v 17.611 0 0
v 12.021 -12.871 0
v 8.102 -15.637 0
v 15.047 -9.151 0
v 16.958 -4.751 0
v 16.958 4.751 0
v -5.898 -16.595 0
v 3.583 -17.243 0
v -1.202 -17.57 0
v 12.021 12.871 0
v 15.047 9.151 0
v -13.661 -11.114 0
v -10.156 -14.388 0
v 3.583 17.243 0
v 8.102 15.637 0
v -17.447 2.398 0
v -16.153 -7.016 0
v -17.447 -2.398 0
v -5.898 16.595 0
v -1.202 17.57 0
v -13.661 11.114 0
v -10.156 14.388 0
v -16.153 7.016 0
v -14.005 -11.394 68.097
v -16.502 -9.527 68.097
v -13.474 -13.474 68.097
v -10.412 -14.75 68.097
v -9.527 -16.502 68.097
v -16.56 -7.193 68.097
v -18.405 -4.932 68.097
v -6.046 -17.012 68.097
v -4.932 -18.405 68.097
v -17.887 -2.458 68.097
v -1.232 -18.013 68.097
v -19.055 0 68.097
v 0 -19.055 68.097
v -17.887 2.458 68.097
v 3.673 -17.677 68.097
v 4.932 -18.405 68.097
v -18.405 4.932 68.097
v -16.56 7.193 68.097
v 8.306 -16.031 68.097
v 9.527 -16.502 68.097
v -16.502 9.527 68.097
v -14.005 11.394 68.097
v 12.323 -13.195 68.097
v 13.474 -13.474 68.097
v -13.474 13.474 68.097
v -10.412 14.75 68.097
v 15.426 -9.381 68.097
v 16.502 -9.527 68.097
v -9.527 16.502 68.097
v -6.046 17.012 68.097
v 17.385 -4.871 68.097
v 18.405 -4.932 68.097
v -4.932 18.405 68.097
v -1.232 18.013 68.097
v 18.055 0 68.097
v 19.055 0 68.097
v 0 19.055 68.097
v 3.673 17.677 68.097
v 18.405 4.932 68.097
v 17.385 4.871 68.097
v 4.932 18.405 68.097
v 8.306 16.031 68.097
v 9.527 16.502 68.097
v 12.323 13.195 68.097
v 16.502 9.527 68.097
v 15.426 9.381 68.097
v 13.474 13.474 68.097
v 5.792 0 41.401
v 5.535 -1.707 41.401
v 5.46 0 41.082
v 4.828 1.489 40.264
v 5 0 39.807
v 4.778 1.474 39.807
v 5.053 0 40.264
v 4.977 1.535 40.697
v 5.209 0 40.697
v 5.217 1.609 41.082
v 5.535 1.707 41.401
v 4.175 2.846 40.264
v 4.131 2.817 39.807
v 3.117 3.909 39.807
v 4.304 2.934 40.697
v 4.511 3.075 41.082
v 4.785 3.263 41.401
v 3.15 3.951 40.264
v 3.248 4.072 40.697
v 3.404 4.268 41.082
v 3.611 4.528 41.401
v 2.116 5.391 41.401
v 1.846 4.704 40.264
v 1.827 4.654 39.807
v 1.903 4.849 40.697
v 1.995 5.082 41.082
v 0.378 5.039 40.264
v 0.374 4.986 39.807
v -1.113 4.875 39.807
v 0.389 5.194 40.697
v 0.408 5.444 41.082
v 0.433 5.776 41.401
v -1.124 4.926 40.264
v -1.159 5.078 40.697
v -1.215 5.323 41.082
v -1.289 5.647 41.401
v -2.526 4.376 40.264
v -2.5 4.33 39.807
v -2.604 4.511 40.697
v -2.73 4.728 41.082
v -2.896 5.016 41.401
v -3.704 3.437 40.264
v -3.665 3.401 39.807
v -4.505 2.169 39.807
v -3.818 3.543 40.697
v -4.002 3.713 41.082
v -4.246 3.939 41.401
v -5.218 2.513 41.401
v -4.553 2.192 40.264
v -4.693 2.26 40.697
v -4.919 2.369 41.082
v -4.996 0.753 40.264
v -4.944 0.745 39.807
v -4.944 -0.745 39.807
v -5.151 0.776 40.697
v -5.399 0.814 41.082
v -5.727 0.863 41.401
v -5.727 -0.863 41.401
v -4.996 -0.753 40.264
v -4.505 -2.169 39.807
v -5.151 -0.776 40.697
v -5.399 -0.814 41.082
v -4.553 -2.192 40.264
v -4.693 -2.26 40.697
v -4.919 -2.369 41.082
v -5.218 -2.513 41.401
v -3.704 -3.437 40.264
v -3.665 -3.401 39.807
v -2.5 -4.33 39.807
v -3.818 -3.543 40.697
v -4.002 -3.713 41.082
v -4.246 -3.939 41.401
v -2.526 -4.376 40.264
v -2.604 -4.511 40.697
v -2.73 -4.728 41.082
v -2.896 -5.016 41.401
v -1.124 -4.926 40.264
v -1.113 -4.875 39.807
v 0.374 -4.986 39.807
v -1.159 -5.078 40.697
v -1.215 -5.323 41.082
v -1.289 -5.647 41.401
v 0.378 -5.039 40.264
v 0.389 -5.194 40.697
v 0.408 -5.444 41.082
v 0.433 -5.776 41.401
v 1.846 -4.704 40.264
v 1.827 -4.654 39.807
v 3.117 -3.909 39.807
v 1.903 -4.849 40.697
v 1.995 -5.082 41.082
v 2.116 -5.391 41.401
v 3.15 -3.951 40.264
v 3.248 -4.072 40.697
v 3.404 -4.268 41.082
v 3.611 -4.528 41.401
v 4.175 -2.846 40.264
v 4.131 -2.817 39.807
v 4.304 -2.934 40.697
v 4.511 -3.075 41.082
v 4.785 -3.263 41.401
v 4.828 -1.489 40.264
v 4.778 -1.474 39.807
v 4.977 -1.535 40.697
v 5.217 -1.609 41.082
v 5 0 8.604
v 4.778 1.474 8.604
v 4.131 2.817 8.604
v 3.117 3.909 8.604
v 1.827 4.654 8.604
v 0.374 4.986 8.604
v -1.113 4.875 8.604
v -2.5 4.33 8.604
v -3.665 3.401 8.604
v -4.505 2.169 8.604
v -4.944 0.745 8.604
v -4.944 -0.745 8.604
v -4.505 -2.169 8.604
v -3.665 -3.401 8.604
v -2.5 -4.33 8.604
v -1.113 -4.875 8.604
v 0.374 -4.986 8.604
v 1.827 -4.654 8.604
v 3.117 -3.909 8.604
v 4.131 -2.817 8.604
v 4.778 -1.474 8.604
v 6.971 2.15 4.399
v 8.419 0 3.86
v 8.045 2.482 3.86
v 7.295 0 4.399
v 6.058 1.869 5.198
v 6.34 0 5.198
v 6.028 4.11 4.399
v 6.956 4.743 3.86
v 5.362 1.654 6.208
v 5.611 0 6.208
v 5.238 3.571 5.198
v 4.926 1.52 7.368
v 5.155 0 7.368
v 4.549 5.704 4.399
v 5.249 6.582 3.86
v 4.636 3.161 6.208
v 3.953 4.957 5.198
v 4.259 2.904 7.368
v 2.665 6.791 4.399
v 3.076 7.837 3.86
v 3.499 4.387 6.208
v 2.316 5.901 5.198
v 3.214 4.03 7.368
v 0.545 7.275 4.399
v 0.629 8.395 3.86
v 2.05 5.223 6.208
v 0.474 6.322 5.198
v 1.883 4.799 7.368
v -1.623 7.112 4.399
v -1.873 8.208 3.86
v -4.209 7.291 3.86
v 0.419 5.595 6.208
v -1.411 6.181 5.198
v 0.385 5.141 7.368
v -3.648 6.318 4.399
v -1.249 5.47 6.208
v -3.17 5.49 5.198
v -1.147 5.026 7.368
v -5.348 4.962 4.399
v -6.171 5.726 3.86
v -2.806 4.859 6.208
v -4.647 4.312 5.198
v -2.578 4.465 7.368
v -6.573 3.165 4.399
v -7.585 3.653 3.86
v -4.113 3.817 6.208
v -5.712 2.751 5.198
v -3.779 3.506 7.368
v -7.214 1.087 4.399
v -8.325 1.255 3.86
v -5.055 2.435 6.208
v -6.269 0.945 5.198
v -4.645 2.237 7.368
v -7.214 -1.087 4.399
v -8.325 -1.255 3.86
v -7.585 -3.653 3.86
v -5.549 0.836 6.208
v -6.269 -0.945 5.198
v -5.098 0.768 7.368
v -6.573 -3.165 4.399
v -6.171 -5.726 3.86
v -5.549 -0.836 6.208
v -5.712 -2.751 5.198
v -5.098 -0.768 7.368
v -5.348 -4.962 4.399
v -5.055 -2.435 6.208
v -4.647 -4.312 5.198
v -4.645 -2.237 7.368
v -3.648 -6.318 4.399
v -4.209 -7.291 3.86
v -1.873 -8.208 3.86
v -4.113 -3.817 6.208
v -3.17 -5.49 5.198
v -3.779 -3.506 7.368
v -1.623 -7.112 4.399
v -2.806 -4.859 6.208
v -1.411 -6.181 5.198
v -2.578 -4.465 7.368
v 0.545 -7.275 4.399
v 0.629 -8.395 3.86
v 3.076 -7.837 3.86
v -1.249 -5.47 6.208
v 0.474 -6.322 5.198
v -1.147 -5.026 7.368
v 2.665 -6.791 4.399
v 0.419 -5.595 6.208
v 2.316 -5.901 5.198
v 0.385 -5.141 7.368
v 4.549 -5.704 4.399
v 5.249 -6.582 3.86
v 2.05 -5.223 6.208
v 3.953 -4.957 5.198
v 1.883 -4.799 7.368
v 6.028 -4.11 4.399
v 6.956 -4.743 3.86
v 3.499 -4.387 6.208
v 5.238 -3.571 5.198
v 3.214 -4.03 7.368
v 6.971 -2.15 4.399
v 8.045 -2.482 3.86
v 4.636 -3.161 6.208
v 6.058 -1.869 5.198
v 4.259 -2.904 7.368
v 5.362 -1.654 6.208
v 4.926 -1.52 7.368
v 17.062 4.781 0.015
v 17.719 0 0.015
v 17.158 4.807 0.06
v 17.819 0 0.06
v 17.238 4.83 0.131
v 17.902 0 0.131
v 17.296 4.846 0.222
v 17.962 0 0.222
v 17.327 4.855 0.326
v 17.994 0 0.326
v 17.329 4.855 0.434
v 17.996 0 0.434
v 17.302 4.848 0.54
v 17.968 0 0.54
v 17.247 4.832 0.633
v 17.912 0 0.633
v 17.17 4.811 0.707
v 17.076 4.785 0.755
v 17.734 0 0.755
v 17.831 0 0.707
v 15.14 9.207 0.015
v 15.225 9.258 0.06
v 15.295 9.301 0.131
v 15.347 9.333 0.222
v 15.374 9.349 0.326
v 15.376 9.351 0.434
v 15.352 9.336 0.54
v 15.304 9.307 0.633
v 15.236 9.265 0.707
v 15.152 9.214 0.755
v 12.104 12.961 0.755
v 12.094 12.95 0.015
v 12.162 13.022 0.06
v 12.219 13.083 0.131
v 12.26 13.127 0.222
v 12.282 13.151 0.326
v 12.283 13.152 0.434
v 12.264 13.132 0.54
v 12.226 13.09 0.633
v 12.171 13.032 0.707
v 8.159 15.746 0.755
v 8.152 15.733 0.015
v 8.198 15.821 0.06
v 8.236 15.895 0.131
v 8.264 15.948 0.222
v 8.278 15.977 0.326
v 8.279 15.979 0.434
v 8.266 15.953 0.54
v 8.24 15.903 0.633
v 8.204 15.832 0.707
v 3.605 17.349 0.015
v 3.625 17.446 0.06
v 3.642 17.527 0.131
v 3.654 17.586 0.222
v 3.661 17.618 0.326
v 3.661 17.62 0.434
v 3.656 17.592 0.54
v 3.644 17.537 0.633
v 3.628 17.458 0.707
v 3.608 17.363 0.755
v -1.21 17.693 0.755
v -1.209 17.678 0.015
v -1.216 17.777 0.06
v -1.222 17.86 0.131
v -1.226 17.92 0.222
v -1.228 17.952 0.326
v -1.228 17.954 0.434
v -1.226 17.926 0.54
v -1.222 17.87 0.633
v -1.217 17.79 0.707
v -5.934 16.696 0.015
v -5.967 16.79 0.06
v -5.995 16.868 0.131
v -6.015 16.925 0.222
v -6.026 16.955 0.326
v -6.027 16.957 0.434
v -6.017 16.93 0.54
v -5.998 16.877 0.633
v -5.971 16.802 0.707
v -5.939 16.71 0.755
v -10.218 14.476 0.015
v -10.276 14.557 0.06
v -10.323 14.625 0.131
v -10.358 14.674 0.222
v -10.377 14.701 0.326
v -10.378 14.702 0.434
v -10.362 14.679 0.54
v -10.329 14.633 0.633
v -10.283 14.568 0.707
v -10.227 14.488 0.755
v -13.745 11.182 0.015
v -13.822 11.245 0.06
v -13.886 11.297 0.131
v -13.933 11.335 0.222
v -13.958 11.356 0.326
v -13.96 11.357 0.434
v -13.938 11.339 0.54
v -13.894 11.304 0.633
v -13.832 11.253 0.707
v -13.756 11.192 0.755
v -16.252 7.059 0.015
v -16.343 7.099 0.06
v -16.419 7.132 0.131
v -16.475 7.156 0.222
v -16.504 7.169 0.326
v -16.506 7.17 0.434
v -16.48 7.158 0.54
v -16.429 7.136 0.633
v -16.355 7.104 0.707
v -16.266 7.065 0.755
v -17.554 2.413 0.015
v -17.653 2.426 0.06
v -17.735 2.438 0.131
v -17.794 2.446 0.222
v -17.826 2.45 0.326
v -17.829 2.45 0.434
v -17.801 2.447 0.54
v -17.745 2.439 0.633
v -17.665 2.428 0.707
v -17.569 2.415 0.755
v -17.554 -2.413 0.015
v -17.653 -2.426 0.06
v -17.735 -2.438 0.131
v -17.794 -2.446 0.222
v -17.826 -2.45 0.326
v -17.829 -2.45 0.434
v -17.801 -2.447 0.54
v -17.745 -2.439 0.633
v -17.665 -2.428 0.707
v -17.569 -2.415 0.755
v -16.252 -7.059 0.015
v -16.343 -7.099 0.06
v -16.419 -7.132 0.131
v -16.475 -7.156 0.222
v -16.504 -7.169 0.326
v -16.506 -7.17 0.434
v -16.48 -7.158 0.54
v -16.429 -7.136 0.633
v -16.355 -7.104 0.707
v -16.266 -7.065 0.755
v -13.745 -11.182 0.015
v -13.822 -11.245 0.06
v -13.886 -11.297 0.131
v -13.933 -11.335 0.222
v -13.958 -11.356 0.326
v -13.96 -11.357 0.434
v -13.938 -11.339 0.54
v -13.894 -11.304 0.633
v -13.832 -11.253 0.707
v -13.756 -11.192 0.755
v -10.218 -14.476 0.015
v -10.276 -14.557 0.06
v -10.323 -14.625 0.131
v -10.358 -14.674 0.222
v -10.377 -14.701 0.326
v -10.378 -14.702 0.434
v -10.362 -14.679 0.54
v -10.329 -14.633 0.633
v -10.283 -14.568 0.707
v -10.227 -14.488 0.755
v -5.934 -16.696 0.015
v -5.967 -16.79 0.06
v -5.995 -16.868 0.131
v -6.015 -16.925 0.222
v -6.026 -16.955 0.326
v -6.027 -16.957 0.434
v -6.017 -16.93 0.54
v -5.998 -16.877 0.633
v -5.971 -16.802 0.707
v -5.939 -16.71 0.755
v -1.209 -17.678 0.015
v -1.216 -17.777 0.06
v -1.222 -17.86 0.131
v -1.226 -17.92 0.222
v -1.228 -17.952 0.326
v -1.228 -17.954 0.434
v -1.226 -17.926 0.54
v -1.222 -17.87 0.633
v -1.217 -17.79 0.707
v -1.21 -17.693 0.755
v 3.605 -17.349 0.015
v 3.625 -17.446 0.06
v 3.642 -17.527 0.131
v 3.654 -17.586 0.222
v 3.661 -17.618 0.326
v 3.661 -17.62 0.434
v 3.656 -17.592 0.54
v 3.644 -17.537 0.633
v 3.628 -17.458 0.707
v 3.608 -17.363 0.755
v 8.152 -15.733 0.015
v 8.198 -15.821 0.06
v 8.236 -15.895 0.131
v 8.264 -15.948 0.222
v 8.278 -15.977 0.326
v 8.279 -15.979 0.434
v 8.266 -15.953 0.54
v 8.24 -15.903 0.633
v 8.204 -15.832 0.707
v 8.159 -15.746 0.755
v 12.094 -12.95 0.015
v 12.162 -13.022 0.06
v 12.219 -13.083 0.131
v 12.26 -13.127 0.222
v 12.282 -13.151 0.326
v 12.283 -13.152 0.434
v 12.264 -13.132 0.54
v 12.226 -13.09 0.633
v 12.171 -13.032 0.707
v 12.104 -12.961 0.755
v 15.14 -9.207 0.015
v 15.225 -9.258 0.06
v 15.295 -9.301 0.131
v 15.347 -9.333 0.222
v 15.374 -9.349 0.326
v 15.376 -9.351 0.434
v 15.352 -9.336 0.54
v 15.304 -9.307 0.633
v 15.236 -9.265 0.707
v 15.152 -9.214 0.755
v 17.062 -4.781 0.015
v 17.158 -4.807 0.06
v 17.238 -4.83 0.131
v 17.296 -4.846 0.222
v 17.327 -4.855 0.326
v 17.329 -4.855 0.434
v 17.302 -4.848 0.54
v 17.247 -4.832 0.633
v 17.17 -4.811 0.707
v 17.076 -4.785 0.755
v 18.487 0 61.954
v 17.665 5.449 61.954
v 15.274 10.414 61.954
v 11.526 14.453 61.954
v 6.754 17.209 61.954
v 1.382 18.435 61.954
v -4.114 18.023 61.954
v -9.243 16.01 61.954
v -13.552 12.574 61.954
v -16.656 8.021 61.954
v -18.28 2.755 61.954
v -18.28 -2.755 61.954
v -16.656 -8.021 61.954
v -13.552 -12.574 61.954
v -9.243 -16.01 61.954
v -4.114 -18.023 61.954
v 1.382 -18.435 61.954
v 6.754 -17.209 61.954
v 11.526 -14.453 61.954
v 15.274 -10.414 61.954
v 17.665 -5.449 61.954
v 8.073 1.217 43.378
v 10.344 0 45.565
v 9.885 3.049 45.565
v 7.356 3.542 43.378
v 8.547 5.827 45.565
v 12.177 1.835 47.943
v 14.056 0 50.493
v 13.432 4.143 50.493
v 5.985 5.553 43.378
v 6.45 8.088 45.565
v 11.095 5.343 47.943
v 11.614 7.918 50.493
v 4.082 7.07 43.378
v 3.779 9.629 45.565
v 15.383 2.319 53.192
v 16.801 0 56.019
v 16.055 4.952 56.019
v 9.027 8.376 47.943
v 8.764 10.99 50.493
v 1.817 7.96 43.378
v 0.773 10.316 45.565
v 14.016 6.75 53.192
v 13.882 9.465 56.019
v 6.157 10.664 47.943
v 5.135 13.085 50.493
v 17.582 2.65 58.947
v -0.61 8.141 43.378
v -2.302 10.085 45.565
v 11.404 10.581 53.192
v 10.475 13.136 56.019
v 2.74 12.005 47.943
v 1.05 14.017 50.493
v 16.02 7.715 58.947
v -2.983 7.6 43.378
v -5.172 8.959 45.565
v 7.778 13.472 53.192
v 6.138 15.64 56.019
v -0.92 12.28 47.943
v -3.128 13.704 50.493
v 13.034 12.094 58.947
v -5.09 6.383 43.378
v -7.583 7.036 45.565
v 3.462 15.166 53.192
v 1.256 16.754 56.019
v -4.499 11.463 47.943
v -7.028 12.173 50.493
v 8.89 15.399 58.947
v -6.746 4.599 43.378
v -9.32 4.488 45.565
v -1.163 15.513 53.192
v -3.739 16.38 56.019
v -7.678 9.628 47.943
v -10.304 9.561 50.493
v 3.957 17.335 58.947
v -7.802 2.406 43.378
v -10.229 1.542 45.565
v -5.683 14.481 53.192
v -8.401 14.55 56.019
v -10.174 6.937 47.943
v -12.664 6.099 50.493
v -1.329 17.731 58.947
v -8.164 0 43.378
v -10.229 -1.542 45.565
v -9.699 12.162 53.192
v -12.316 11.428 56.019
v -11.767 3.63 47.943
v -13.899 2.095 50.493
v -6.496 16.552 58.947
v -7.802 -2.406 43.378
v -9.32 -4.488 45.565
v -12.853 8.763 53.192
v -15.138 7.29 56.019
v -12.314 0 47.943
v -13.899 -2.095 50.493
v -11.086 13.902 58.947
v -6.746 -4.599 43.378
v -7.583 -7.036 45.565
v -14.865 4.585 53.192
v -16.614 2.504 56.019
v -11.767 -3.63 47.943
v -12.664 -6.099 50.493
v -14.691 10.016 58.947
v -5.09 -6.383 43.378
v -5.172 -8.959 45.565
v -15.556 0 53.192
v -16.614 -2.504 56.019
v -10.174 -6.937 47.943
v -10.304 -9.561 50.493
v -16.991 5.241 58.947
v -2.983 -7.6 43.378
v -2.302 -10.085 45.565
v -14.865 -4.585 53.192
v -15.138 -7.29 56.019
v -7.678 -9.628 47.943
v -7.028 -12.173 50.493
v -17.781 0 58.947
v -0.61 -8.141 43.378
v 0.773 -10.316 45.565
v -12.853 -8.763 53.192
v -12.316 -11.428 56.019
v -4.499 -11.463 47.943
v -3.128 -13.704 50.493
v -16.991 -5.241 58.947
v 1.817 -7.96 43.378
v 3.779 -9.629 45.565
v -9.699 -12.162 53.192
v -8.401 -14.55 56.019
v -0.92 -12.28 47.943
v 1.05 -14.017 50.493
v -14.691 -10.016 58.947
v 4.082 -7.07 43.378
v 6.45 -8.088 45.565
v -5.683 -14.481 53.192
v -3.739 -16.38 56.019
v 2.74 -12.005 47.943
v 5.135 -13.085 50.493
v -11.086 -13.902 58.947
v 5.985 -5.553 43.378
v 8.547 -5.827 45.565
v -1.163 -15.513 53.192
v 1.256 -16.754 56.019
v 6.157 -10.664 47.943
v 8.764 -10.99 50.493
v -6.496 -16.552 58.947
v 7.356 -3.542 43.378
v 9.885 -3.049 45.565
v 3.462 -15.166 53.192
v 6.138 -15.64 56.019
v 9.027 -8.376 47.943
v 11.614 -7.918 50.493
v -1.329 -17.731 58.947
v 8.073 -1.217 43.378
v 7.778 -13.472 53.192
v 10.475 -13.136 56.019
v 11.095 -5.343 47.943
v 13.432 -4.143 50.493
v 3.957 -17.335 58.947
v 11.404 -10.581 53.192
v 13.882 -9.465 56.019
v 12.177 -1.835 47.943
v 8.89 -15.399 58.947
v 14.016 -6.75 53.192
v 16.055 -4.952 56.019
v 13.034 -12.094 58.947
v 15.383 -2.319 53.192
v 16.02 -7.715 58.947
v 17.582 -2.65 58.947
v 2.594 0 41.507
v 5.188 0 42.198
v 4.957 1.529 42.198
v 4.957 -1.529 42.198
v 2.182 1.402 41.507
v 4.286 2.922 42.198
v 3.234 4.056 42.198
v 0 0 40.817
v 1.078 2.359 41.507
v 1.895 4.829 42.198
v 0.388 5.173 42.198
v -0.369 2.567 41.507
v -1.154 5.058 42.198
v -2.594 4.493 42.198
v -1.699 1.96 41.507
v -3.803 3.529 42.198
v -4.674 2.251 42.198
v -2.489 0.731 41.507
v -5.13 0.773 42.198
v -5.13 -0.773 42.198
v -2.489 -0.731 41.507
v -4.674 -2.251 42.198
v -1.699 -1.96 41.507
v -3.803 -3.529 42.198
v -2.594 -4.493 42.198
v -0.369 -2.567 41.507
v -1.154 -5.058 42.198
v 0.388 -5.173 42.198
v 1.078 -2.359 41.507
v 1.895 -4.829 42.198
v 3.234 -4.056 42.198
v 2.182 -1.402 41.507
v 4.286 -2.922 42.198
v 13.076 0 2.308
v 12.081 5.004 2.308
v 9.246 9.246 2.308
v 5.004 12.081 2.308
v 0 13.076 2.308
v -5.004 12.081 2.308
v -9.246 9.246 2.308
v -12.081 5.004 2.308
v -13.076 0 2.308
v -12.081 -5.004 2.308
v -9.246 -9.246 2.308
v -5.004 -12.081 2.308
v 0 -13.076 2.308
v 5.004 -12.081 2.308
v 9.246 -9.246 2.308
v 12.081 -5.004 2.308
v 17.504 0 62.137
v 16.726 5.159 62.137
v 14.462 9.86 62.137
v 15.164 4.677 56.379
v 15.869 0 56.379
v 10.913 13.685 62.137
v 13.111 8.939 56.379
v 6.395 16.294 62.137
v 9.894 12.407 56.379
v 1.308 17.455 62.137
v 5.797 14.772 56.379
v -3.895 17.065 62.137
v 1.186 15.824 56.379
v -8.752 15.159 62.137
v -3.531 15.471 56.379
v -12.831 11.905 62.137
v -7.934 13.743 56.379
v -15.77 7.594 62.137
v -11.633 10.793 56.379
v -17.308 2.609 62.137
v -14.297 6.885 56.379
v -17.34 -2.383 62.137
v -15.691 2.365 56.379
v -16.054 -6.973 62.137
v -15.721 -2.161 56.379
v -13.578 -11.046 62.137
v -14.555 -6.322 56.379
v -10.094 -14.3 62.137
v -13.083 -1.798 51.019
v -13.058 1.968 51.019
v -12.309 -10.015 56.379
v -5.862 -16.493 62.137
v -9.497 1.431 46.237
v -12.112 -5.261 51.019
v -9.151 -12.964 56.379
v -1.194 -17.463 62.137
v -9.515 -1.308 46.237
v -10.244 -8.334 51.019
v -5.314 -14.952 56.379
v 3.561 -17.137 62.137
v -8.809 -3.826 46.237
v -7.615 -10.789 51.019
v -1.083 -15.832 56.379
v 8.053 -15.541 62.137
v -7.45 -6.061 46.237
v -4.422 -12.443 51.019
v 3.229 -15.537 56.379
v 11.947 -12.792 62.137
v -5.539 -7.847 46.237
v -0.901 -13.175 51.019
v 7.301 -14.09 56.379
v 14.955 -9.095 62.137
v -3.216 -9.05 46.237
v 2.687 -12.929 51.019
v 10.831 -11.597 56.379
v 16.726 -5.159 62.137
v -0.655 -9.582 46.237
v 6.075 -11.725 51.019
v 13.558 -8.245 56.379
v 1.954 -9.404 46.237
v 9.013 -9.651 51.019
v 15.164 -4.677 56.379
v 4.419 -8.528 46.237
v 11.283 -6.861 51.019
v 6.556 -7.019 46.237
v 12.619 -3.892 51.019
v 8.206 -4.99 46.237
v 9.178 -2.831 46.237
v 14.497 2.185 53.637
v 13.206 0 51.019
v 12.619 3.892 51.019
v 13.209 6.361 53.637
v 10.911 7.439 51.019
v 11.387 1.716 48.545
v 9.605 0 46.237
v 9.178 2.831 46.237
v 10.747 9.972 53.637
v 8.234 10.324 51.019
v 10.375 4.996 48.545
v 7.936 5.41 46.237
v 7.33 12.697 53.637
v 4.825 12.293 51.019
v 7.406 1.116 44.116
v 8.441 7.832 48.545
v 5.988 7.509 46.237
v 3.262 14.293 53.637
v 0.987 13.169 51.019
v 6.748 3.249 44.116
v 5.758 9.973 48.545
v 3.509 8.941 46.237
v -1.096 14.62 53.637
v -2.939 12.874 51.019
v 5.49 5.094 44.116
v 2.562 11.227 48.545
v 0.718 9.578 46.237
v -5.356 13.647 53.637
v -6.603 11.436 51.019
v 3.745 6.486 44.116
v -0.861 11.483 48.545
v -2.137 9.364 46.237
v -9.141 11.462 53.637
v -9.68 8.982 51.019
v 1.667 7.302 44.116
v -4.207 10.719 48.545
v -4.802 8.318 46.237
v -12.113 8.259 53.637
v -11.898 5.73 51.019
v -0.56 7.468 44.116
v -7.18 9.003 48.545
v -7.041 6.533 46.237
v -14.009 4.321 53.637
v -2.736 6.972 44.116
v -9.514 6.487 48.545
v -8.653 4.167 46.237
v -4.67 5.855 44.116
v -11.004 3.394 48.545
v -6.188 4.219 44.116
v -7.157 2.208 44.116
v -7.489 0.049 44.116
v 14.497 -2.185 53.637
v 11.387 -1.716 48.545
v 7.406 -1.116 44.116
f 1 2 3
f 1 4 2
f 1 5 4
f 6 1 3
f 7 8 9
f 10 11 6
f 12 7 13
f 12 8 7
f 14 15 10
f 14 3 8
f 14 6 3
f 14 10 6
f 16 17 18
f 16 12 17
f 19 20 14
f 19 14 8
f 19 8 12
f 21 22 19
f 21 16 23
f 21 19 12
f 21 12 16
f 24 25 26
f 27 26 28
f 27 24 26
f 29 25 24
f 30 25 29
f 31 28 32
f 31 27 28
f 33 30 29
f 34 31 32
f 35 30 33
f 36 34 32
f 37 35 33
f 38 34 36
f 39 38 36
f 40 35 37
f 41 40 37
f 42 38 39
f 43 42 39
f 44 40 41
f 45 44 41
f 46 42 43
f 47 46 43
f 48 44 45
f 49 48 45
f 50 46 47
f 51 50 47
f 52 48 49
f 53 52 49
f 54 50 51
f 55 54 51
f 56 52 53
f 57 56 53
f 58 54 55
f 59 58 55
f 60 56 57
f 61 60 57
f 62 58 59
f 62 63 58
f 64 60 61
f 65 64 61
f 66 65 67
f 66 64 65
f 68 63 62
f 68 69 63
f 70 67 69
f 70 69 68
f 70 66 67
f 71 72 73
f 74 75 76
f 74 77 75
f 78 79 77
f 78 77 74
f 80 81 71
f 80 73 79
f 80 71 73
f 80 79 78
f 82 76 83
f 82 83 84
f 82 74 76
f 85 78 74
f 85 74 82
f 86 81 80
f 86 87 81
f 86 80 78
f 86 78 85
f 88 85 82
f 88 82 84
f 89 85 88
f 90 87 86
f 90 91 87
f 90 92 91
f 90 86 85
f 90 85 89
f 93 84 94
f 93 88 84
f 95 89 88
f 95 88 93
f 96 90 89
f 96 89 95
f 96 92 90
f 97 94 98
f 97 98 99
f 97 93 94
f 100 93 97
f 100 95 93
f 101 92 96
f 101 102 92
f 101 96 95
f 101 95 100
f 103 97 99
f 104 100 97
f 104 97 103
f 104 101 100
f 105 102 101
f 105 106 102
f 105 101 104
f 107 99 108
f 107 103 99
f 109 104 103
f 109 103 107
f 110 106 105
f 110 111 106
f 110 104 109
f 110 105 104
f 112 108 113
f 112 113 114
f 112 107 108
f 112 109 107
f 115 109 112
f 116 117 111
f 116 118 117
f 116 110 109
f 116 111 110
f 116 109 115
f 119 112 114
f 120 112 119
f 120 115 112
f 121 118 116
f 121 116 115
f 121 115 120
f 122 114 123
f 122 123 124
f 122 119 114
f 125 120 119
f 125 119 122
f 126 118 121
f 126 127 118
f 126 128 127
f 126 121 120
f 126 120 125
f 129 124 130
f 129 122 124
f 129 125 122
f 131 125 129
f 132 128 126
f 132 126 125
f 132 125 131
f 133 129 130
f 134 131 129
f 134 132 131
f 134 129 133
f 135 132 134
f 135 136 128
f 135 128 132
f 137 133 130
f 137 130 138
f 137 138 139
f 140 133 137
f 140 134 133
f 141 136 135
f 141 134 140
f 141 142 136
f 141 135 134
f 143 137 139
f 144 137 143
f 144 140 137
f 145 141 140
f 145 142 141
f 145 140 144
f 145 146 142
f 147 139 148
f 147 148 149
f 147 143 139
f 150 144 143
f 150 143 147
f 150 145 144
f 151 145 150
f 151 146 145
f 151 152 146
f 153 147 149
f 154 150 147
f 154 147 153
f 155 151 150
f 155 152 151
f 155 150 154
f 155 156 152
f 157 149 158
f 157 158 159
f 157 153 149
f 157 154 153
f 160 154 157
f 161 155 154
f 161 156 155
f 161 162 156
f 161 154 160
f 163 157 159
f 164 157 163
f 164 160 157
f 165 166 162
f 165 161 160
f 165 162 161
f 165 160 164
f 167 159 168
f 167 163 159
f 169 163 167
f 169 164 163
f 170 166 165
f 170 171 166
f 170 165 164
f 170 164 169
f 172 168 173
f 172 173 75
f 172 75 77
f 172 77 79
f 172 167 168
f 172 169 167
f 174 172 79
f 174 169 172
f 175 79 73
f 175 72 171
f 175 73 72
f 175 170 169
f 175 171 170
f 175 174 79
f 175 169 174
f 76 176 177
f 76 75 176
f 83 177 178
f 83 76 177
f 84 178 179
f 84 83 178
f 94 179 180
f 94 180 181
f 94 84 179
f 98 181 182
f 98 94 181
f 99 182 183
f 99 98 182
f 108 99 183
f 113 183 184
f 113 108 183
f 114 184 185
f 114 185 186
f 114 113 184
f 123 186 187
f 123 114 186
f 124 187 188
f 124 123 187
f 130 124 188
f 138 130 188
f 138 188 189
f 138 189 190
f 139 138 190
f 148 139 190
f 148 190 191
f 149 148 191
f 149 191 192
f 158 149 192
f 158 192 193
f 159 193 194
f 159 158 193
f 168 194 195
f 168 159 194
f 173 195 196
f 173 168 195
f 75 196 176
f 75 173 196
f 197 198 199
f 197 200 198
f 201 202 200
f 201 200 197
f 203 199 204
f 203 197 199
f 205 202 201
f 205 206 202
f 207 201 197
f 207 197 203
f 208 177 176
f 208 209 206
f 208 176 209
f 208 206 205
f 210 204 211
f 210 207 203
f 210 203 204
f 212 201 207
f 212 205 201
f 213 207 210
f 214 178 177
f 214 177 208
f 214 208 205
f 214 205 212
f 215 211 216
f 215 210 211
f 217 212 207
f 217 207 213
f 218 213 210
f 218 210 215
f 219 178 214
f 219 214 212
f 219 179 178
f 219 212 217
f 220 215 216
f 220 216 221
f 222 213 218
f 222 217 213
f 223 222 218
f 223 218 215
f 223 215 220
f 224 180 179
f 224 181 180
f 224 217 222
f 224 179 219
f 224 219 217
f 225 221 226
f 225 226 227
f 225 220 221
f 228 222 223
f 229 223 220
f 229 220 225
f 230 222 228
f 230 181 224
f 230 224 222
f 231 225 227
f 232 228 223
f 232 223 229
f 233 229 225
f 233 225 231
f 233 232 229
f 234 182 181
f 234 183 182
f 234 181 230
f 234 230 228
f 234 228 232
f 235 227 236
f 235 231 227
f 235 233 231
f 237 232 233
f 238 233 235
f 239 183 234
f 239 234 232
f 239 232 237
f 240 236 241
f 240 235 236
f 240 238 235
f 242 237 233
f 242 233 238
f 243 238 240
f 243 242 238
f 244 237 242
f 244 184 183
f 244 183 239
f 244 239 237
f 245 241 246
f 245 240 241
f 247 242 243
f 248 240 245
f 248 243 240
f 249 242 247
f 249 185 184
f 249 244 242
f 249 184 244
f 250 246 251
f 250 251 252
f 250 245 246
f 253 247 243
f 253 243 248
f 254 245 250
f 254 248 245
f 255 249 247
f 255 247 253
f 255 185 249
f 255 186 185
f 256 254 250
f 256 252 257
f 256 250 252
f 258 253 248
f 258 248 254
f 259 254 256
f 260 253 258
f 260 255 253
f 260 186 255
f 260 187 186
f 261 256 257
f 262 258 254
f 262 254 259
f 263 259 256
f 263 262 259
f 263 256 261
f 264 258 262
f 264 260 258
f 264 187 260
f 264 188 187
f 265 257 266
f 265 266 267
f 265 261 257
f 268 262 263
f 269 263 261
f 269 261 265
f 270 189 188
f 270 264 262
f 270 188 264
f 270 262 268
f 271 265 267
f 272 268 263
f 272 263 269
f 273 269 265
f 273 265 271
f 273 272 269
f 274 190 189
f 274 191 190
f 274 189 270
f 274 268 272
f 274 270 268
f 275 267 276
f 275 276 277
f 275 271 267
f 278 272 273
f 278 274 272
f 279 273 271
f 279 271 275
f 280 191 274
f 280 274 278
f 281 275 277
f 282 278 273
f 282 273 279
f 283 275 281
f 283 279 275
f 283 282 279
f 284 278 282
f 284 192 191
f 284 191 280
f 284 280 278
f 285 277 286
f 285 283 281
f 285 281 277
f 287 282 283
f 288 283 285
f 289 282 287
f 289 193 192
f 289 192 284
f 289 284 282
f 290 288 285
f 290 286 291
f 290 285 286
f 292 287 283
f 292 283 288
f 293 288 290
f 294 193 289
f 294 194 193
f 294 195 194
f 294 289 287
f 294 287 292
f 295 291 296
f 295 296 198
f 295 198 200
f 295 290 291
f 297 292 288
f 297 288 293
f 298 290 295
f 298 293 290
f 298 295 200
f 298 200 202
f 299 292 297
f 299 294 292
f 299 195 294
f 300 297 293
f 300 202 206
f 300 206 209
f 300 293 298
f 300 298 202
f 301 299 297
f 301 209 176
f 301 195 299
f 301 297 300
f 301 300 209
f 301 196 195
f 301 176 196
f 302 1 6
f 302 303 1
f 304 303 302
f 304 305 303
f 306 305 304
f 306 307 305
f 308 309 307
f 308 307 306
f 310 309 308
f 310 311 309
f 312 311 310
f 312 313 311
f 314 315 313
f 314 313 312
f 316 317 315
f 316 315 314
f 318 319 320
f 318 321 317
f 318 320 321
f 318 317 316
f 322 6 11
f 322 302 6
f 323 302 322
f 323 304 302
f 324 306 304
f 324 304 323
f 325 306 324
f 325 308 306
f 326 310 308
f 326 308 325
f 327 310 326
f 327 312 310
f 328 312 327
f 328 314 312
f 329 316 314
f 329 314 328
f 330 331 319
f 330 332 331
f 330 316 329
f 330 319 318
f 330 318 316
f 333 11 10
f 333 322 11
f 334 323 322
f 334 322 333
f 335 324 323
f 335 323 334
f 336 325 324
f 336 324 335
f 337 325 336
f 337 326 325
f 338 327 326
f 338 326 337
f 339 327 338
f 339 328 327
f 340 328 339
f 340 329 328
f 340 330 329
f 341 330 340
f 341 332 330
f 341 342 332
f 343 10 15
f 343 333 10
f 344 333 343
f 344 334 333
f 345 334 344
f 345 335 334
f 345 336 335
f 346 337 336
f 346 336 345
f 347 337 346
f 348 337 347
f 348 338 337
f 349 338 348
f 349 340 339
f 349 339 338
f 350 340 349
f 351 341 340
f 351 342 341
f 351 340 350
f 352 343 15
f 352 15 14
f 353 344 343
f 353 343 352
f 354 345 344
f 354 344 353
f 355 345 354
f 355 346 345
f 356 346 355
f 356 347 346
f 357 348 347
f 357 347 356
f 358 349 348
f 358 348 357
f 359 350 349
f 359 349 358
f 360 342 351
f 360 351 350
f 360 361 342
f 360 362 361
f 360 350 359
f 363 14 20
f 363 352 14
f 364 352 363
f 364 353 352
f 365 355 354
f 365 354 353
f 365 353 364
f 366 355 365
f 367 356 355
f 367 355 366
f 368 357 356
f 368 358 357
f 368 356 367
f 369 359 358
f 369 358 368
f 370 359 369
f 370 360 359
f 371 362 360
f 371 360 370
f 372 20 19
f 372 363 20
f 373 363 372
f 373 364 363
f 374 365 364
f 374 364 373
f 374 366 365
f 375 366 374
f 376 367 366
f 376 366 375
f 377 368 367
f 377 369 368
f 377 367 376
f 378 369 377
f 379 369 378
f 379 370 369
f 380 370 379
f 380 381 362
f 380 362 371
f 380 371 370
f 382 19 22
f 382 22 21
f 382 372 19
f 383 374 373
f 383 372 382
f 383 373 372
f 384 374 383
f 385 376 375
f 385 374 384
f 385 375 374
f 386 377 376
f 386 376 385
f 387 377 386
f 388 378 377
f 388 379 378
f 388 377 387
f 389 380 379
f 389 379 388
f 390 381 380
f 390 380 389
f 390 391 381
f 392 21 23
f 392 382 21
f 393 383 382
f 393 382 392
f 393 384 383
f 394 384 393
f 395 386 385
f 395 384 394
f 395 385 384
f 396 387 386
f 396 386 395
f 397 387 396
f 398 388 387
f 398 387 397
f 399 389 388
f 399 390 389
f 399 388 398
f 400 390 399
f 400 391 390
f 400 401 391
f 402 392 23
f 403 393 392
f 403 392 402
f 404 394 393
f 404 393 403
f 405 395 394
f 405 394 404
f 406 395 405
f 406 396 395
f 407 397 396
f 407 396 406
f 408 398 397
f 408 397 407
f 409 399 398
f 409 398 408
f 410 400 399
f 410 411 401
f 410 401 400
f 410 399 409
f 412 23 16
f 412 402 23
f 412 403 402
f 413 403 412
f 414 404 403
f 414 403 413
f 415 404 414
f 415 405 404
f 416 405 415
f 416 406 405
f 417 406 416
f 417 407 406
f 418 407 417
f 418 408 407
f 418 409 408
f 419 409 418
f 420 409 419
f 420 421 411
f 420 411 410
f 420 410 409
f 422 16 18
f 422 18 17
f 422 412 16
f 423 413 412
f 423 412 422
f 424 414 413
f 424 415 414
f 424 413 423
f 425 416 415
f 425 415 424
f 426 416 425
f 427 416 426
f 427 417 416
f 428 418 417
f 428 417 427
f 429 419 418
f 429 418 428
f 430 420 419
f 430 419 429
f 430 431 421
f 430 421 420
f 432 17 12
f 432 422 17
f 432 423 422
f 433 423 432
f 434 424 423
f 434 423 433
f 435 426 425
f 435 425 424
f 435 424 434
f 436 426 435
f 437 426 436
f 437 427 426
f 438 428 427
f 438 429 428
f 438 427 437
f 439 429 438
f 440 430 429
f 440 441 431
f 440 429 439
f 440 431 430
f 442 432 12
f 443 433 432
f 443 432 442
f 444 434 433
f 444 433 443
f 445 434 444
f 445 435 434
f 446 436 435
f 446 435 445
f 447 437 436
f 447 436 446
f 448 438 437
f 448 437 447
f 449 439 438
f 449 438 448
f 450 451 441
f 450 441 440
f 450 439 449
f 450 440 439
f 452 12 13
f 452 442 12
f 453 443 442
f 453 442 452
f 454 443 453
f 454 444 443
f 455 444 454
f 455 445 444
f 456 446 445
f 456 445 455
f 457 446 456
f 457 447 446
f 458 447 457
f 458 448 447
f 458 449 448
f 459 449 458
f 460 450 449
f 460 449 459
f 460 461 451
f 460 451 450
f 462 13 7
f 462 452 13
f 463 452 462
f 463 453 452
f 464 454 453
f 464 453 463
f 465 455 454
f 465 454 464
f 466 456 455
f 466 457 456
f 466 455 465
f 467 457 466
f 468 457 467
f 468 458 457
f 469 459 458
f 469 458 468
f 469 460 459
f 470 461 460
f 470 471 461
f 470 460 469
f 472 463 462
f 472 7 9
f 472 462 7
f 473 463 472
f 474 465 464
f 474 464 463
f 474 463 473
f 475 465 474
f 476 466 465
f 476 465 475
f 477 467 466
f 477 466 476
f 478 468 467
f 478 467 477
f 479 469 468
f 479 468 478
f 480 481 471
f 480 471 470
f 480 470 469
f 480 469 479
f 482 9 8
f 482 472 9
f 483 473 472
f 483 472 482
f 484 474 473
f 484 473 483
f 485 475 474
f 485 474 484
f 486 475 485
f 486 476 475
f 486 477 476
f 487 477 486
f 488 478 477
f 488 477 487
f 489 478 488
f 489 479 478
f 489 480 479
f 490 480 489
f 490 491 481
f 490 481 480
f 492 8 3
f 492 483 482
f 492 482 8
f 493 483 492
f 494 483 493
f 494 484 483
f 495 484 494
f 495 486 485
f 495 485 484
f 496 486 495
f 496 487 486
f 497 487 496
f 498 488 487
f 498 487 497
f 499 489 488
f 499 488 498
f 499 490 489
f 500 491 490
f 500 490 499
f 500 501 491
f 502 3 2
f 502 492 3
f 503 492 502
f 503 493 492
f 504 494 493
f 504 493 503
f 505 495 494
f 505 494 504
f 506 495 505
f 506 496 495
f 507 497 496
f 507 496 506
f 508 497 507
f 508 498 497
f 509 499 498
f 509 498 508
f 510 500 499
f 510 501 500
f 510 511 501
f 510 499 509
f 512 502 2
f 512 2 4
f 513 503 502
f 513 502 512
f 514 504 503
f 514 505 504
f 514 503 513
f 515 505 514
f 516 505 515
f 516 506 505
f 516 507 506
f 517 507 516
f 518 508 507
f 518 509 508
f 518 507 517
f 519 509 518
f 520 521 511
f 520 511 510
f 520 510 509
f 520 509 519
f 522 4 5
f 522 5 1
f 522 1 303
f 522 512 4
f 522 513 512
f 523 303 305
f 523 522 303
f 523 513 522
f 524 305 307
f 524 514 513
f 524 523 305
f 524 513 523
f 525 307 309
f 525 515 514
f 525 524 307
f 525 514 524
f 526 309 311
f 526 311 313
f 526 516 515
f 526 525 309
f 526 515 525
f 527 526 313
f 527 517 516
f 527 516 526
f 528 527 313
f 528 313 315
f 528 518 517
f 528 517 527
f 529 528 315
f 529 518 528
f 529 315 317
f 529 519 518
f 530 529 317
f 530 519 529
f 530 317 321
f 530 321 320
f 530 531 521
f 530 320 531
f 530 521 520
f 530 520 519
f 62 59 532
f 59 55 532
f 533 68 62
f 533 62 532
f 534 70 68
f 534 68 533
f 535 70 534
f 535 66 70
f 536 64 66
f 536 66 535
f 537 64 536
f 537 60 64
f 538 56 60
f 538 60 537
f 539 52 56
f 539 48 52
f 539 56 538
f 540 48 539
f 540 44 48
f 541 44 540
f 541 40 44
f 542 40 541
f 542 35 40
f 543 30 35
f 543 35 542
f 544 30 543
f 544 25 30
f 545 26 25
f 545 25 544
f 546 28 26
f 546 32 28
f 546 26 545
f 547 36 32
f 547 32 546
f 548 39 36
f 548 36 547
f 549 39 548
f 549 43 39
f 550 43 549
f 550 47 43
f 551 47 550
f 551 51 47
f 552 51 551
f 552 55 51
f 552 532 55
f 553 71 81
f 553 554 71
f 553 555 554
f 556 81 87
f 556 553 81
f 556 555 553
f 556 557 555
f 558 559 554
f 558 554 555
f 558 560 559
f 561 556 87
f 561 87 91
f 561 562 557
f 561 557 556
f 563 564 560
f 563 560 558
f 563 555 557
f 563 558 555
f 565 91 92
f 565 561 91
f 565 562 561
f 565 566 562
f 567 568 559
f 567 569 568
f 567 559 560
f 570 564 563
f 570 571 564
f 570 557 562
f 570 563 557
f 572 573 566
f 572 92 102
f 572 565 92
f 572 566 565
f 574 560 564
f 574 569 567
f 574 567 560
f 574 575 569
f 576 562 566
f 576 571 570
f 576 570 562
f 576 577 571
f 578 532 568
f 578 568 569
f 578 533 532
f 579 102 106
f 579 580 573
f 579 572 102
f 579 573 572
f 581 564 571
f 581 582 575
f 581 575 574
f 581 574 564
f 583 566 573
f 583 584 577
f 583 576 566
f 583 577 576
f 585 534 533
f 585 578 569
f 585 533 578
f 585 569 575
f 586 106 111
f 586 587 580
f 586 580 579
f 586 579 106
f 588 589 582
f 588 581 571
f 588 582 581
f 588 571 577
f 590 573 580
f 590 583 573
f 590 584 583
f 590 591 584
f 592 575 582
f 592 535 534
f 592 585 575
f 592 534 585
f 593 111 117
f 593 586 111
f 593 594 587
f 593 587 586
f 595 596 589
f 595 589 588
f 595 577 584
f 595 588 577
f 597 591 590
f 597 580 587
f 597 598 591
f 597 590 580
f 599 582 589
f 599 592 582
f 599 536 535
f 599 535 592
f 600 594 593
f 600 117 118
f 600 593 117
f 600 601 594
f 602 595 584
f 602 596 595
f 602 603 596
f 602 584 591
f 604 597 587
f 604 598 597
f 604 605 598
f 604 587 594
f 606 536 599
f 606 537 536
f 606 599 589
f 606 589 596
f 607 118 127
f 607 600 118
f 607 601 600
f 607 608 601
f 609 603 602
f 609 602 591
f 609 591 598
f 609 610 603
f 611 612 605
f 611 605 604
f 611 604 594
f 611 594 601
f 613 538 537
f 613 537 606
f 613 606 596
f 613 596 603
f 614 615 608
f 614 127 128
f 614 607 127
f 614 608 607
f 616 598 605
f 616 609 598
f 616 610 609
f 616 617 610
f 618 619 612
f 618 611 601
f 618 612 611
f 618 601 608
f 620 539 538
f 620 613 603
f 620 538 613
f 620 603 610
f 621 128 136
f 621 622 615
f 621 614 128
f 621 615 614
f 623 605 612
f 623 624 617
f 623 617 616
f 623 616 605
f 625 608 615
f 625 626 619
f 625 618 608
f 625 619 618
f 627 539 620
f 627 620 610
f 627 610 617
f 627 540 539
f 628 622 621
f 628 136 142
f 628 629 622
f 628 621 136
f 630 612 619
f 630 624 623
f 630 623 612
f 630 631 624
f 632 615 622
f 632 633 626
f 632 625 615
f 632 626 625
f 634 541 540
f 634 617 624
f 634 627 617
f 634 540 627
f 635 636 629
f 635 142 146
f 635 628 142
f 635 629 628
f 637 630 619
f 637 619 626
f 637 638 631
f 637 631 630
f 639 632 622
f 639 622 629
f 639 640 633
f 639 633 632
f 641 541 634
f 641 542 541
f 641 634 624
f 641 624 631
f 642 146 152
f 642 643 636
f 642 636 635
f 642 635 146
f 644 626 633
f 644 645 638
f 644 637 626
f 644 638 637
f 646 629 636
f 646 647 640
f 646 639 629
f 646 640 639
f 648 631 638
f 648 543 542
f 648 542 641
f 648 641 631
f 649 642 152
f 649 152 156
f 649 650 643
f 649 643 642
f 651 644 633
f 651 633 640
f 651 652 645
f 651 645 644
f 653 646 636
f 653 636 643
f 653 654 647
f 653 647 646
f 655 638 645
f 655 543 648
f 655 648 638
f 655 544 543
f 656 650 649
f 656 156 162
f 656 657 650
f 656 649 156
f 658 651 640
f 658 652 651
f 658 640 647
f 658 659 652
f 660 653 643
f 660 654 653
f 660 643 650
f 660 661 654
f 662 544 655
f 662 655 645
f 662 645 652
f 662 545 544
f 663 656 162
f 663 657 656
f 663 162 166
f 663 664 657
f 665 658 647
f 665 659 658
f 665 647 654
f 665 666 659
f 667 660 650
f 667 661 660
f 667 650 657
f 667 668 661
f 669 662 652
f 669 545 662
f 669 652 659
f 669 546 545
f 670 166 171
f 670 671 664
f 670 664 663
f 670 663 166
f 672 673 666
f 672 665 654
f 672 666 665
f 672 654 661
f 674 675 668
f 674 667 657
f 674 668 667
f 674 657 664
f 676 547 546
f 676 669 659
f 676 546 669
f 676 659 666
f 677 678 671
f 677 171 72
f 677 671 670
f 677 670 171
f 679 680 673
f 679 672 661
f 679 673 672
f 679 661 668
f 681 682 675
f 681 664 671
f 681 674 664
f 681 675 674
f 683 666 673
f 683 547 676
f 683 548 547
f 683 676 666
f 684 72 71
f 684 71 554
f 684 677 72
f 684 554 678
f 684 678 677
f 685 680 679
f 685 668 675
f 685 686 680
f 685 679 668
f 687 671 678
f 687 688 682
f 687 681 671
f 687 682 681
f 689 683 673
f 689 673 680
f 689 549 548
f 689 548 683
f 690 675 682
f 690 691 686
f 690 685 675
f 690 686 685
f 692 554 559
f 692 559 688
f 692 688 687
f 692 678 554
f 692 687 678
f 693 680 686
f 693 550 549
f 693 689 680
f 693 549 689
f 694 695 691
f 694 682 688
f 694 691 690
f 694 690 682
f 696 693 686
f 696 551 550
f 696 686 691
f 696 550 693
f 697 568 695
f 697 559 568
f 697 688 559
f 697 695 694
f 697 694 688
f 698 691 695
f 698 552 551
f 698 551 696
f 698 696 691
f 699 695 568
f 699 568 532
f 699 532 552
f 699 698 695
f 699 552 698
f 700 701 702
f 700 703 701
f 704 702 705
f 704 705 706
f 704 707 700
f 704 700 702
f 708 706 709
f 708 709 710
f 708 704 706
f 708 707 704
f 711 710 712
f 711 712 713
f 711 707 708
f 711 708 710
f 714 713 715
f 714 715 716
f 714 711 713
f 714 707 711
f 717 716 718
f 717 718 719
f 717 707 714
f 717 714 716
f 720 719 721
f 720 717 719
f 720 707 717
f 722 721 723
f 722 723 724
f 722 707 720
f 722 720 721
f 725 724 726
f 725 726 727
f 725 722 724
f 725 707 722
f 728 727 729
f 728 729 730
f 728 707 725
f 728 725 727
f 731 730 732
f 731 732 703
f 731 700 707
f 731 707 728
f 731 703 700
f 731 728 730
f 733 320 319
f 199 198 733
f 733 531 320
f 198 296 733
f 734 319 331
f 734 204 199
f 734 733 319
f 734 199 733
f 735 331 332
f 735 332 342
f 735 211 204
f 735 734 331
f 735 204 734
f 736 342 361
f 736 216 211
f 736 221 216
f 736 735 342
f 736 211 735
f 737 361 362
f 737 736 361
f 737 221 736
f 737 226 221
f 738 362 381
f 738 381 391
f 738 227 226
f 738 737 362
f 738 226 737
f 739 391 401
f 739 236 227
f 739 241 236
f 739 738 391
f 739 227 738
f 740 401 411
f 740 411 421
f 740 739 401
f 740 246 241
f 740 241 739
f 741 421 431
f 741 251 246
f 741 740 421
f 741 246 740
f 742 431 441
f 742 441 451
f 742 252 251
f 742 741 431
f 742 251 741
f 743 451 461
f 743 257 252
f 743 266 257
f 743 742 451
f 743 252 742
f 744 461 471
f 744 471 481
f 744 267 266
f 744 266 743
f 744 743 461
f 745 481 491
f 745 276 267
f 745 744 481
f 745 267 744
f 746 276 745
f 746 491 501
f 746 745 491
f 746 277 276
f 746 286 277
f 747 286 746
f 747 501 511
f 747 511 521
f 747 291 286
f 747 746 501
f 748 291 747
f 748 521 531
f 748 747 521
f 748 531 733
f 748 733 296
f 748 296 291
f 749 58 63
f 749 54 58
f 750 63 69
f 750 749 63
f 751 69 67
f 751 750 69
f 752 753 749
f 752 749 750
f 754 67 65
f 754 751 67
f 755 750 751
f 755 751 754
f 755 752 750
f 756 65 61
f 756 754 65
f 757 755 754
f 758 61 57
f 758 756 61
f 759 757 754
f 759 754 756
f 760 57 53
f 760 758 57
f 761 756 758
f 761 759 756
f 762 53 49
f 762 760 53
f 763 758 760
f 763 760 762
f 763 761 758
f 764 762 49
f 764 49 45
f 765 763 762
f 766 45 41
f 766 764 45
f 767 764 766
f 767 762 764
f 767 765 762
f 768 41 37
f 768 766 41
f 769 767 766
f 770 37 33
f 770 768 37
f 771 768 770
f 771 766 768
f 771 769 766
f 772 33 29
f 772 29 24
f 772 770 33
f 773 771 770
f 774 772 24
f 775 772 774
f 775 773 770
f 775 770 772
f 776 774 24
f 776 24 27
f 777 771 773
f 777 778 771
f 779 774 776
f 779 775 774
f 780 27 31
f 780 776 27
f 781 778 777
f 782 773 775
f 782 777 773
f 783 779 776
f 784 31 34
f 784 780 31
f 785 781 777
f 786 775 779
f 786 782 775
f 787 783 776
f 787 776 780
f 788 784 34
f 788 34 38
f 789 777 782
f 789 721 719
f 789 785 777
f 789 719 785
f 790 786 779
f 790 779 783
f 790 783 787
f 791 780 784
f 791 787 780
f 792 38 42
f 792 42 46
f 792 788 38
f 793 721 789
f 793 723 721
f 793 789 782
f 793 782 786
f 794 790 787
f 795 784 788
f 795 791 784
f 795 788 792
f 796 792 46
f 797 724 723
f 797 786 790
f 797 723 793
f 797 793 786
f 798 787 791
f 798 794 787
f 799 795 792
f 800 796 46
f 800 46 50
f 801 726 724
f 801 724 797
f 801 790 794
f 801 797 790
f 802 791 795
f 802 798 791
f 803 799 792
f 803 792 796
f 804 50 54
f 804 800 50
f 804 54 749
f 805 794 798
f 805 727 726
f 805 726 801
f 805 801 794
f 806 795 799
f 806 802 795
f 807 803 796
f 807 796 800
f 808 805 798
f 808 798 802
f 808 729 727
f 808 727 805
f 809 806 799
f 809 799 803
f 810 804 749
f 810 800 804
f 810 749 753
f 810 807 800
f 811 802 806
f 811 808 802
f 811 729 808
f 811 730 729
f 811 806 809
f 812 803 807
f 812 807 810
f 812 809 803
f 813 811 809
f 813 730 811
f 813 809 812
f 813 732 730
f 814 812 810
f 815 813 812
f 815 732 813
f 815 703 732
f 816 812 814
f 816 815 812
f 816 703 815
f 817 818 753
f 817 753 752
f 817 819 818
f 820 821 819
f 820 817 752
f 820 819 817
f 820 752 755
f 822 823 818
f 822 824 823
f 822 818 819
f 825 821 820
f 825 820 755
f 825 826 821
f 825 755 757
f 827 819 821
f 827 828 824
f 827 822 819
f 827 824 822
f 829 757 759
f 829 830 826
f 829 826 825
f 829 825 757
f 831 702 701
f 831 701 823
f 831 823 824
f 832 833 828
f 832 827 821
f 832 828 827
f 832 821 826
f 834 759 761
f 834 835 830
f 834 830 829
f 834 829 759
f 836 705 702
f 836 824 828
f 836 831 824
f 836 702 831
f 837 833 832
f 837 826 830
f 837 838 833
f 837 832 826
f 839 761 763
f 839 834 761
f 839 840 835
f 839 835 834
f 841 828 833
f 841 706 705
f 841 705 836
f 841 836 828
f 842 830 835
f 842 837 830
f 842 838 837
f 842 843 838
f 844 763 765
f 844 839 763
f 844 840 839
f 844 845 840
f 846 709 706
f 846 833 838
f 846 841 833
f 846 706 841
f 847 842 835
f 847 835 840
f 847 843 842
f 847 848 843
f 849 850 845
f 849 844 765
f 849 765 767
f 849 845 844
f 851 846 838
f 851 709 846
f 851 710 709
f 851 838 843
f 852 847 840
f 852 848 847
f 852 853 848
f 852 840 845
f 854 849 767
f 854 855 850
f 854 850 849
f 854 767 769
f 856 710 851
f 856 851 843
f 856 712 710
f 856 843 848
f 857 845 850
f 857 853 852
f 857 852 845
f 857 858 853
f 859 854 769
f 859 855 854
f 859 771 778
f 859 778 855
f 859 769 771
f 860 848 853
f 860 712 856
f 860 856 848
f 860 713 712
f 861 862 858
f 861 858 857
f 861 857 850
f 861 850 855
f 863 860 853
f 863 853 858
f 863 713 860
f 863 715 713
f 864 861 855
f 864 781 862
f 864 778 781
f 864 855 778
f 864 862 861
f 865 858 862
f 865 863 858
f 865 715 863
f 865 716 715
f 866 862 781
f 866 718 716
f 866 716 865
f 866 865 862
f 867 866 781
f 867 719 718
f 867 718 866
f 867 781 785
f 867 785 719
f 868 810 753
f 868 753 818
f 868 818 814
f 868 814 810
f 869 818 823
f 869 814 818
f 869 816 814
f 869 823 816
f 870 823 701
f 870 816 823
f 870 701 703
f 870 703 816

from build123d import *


with BuildPart() as f1:
    # F0 (on Front) → F1 (revolve)
    with BuildSketch(Plane.XZ):
        with BuildLine():
            Line((0, 40.816609), (0, 0))
            Line((0, 0), (17.611366, 0))
            ThreePointArc((17.611366, 0), (17.993982, 0.325532), (17.733942, 0.755353))
            Line((17.733942, 0.755353), (8.418861, 3.86038))
            ThreePointArc((8.418861, 3.86038), (5.943789, 5.680245), (5, 8.603796))
            Line((5, 8.603796), (5, 39.806811))
            ThreePointArc((5, 39.806811), (5.208859, 40.696651), (5.791815, 41.40064))
            ThreePointArc((5.791815, 41.40064), (15.556327, 53.192449), (19.054722, 68.097269))
            Line((19.054722, 68.097269), (18.054722, 68.097269))
            ThreePointArc((18.054722, 68.097269), (14.660757, 53.637369), (5.187723, 42.197554))
            Line((5.187723, 42.197554), (0, 40.816609))
        make_face()
    revolve(axis=Axis((0, 0, 20.408305), (0, 0, 1)))


solid = f1.part
